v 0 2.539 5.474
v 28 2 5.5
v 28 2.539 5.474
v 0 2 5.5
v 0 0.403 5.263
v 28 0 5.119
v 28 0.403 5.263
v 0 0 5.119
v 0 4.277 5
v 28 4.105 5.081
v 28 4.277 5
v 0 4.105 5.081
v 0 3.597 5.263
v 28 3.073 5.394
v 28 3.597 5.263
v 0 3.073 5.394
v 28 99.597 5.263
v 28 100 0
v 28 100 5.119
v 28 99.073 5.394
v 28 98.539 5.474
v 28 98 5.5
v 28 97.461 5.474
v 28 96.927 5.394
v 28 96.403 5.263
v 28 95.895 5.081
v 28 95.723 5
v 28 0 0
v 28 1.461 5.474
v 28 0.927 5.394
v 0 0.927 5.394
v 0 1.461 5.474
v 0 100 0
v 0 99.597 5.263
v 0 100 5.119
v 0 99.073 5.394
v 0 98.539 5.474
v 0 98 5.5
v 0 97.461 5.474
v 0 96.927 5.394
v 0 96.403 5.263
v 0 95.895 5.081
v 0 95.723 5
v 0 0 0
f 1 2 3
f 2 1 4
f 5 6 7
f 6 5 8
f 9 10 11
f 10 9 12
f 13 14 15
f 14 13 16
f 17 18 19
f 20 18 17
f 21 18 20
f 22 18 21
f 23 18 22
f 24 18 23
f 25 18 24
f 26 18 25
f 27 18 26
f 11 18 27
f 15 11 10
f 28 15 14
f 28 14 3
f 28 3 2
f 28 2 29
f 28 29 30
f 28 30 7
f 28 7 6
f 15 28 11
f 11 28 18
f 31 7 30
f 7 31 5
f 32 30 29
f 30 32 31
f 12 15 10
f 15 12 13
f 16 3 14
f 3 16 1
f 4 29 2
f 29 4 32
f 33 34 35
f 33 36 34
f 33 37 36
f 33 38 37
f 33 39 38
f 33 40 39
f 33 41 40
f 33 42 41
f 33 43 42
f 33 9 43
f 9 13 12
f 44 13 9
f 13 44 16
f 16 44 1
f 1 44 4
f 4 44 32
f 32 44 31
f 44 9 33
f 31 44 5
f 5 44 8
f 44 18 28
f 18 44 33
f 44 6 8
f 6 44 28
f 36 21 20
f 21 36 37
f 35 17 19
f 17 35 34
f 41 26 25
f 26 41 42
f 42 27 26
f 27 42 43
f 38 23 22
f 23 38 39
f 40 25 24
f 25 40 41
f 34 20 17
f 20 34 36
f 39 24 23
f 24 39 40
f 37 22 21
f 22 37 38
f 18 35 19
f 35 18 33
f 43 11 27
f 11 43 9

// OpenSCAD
module plate()
{
	union()
	{
		cube([28,100,5]);
	
		intersection()
		{
			translate([0,2,0])
			rotate([0,90,0])
			cylinder(r=5.5, h=28, $fn=64);
	
			cube([28,100,6]);
		}
	
		intersection()
		{
			translate([0,100-2,0])
			rotate([0,90,0])
			cylinder(r=5.5, h=28, $fn=64);
	
			cube([28,100,6]);
		}
	}
}
plate();
